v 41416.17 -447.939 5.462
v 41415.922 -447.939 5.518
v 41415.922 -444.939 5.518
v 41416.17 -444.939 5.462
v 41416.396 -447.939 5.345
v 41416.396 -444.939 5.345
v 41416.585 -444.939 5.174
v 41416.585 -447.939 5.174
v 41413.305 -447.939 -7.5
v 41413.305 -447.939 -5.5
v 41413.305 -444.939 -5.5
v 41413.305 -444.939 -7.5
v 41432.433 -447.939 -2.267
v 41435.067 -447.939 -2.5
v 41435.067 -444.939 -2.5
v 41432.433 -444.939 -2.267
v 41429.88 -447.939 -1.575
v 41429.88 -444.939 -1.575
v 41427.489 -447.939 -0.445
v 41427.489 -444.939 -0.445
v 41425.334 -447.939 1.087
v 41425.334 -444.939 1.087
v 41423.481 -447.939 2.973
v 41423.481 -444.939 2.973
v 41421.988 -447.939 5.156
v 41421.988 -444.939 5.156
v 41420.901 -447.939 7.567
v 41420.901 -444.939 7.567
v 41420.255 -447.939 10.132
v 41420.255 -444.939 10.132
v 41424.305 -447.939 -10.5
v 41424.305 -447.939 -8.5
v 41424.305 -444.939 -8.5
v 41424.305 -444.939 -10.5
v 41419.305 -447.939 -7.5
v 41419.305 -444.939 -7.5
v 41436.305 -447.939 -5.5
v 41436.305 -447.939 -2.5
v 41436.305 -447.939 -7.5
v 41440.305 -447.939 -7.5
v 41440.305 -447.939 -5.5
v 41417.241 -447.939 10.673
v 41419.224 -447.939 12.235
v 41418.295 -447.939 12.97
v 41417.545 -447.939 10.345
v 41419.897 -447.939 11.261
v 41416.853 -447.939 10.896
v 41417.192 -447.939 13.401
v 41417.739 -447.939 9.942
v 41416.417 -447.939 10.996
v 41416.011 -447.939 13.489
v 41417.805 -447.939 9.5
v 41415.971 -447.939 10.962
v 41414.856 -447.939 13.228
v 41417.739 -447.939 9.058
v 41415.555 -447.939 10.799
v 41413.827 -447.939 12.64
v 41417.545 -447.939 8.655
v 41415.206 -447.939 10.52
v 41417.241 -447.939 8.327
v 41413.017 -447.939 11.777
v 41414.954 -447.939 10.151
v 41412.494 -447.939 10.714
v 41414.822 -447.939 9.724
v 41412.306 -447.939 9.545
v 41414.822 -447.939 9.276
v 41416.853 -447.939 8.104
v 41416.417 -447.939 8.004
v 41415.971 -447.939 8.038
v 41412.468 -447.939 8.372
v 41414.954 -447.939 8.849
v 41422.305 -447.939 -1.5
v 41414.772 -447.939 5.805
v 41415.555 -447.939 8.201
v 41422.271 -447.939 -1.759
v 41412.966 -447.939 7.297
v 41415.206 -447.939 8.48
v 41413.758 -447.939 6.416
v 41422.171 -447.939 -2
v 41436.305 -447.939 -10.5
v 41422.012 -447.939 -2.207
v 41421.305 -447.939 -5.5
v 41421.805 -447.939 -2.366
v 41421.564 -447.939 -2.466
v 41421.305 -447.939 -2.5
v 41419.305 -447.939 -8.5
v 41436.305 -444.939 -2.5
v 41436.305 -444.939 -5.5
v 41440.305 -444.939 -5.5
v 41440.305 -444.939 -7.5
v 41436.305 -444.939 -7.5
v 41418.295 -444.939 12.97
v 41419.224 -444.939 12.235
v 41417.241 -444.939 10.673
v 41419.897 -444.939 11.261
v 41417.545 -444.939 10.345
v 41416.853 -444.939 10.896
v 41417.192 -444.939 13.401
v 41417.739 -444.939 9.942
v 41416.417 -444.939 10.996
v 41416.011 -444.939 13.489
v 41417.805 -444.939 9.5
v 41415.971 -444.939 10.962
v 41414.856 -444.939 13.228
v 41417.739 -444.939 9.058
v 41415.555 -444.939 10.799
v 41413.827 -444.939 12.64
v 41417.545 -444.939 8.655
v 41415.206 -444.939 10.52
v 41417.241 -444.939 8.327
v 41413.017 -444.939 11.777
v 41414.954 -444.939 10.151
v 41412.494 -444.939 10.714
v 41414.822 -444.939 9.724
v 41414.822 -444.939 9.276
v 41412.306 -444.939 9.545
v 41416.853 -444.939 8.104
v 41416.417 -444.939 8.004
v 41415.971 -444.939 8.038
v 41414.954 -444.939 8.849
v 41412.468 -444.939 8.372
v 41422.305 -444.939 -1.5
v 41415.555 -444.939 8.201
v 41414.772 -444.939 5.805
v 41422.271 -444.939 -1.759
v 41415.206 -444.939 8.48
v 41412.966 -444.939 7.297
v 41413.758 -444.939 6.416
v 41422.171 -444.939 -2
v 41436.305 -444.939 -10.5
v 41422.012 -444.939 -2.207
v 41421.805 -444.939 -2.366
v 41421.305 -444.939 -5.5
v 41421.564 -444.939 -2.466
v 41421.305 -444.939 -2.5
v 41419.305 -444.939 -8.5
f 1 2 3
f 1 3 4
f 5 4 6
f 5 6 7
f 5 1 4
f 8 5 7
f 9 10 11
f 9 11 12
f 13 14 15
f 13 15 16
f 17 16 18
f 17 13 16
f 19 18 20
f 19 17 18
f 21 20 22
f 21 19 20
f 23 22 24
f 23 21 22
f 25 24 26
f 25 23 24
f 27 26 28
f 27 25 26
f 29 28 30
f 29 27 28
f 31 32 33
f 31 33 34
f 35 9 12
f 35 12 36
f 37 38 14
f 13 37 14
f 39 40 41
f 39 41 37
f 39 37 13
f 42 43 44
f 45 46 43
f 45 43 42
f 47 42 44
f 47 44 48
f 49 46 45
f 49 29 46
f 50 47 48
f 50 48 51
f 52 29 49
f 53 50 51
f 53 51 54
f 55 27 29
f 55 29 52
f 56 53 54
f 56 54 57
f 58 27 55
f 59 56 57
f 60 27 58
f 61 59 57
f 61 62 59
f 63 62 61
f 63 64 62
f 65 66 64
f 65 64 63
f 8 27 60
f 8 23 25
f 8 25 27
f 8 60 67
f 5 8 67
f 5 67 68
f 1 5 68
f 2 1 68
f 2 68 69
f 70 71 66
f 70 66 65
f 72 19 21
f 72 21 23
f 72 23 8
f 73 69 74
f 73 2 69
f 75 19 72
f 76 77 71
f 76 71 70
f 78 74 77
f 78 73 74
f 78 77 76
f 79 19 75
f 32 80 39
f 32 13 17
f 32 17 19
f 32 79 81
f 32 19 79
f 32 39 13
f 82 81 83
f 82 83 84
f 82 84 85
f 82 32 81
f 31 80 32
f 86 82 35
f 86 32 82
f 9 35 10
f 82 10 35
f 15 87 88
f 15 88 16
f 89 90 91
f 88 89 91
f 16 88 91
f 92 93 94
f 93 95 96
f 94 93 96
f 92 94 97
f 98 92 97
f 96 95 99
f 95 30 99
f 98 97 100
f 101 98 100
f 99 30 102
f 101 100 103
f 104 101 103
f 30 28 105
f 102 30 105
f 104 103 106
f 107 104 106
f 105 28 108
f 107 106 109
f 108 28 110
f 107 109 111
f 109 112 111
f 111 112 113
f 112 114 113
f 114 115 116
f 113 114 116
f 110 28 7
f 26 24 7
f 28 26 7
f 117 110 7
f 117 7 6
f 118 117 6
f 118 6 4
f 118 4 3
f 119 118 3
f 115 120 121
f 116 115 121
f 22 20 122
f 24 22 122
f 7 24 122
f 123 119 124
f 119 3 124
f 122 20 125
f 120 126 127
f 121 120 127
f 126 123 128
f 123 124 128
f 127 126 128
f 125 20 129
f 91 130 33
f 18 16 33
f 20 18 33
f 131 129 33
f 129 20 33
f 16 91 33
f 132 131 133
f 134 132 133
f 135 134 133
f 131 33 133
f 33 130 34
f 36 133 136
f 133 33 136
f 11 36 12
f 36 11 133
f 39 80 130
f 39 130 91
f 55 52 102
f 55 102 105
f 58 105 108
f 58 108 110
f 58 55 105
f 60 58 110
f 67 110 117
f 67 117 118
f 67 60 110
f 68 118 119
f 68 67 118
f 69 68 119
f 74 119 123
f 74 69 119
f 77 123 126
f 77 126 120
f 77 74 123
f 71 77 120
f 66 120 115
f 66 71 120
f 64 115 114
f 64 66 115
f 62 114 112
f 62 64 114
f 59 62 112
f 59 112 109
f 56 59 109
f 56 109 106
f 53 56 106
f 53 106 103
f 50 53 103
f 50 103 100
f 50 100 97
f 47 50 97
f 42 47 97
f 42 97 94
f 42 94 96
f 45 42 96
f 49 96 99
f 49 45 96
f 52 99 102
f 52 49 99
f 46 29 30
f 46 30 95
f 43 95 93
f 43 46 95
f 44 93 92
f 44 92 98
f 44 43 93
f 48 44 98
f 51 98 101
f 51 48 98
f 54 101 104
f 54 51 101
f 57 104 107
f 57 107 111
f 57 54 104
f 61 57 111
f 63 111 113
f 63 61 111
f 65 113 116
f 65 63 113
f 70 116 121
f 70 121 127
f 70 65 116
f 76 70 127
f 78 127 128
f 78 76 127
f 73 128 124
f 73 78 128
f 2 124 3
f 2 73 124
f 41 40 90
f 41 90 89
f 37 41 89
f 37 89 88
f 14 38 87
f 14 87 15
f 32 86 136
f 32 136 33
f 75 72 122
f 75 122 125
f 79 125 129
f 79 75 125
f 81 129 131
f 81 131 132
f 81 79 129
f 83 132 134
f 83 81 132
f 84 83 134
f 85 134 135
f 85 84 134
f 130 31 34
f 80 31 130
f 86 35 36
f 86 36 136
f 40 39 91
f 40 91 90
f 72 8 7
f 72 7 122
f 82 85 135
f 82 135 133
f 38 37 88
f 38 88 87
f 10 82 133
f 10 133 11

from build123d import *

# Parameters (mm, degrees)
CROQUIS1_R                 = 1.5
SALIENTE_EXTRUIR1_DEPTH    = 3
S_LIDO_MOVER_COPIAR1_ANGLE = 90


with BuildPart() as part:
    # Croquis1 → Saliente-Extruir1 (new body)
    with BuildSketch(Plane.XY):
        with BuildLine():
            Line((41421.305272486, -442.43949549), (41421.305272486, -439.43949549))
            Line((41421.305272486, -439.43949549), (41413.305272486, -439.43949549))
            Line((41413.305272486, -439.43949549), (41413.305272486, -437.43949549))
            Line((41413.305272486, -437.43949549), (41419.305272486, -437.43949549))
            Line((41419.305272486, -437.43949549), (41419.305272486, -436.43949549))
            Line((41419.305272486, -436.43949549), (41424.305272486, -436.43949549))
            Line((41424.305272486, -436.43949549), (41424.305272486, -434.43949549))
            Line((41424.305272486, -434.43949549), (41436.305272486, -434.43949549))
            Line((41436.305272486, -434.43949549), (41436.305272486, -437.43949549))
            Line((41436.305272486, -437.43949549), (41440.305272486, -437.43949549))
            Line((41440.305272486, -437.43949549), (41440.305272486, -439.43949549))
            Line((41440.305272486, -439.43949549), (41436.305272486, -439.43949549))
            Line((41436.305272486, -439.43949549), (41436.305272486, -442.43949549))
            Line((41436.305272486, -442.43949549), (41435.066935525, -442.43949549))
            ThreePointArc((41435.066935525, -442.43949549), (41425.333650257, -446.026206837), (41420.255096284, -455.071074438))
            ThreePointArc((41420.255096284, -455.071074438), (41413.38989409, -457.178212126), (41415.921508638, -450.457947386))
            ThreePointArc((41415.921508638, -450.457947386), (41416.286574465, -450.349956968), (41416.584824278, -450.113351733))
            Line((41416.584824278, -450.113351733), (41422.305272486, -443.43949549))
            ThreePointArc((41422.305272486, -443.43949549), (41422.012379267, -442.732388709), (41421.305272486, -442.43949549))
        make_face()
        with Locations((41416.305272486, -454.43949549)):
            Circle(CROQUIS1_R, mode=Mode.SUBTRACT)
    extrude(amount=SALIENTE_EXTRUIR1_DEPTH)


with BuildPart() as part_1:
    # Sólido-Mover/Copiar1: moved
    add(part.part.rotate(Axis((0, -446.43949549, 1.5), (-1, 0, 0)), S_LIDO_MOVER_COPIAR1_ANGLE))


solid = part_1.part
